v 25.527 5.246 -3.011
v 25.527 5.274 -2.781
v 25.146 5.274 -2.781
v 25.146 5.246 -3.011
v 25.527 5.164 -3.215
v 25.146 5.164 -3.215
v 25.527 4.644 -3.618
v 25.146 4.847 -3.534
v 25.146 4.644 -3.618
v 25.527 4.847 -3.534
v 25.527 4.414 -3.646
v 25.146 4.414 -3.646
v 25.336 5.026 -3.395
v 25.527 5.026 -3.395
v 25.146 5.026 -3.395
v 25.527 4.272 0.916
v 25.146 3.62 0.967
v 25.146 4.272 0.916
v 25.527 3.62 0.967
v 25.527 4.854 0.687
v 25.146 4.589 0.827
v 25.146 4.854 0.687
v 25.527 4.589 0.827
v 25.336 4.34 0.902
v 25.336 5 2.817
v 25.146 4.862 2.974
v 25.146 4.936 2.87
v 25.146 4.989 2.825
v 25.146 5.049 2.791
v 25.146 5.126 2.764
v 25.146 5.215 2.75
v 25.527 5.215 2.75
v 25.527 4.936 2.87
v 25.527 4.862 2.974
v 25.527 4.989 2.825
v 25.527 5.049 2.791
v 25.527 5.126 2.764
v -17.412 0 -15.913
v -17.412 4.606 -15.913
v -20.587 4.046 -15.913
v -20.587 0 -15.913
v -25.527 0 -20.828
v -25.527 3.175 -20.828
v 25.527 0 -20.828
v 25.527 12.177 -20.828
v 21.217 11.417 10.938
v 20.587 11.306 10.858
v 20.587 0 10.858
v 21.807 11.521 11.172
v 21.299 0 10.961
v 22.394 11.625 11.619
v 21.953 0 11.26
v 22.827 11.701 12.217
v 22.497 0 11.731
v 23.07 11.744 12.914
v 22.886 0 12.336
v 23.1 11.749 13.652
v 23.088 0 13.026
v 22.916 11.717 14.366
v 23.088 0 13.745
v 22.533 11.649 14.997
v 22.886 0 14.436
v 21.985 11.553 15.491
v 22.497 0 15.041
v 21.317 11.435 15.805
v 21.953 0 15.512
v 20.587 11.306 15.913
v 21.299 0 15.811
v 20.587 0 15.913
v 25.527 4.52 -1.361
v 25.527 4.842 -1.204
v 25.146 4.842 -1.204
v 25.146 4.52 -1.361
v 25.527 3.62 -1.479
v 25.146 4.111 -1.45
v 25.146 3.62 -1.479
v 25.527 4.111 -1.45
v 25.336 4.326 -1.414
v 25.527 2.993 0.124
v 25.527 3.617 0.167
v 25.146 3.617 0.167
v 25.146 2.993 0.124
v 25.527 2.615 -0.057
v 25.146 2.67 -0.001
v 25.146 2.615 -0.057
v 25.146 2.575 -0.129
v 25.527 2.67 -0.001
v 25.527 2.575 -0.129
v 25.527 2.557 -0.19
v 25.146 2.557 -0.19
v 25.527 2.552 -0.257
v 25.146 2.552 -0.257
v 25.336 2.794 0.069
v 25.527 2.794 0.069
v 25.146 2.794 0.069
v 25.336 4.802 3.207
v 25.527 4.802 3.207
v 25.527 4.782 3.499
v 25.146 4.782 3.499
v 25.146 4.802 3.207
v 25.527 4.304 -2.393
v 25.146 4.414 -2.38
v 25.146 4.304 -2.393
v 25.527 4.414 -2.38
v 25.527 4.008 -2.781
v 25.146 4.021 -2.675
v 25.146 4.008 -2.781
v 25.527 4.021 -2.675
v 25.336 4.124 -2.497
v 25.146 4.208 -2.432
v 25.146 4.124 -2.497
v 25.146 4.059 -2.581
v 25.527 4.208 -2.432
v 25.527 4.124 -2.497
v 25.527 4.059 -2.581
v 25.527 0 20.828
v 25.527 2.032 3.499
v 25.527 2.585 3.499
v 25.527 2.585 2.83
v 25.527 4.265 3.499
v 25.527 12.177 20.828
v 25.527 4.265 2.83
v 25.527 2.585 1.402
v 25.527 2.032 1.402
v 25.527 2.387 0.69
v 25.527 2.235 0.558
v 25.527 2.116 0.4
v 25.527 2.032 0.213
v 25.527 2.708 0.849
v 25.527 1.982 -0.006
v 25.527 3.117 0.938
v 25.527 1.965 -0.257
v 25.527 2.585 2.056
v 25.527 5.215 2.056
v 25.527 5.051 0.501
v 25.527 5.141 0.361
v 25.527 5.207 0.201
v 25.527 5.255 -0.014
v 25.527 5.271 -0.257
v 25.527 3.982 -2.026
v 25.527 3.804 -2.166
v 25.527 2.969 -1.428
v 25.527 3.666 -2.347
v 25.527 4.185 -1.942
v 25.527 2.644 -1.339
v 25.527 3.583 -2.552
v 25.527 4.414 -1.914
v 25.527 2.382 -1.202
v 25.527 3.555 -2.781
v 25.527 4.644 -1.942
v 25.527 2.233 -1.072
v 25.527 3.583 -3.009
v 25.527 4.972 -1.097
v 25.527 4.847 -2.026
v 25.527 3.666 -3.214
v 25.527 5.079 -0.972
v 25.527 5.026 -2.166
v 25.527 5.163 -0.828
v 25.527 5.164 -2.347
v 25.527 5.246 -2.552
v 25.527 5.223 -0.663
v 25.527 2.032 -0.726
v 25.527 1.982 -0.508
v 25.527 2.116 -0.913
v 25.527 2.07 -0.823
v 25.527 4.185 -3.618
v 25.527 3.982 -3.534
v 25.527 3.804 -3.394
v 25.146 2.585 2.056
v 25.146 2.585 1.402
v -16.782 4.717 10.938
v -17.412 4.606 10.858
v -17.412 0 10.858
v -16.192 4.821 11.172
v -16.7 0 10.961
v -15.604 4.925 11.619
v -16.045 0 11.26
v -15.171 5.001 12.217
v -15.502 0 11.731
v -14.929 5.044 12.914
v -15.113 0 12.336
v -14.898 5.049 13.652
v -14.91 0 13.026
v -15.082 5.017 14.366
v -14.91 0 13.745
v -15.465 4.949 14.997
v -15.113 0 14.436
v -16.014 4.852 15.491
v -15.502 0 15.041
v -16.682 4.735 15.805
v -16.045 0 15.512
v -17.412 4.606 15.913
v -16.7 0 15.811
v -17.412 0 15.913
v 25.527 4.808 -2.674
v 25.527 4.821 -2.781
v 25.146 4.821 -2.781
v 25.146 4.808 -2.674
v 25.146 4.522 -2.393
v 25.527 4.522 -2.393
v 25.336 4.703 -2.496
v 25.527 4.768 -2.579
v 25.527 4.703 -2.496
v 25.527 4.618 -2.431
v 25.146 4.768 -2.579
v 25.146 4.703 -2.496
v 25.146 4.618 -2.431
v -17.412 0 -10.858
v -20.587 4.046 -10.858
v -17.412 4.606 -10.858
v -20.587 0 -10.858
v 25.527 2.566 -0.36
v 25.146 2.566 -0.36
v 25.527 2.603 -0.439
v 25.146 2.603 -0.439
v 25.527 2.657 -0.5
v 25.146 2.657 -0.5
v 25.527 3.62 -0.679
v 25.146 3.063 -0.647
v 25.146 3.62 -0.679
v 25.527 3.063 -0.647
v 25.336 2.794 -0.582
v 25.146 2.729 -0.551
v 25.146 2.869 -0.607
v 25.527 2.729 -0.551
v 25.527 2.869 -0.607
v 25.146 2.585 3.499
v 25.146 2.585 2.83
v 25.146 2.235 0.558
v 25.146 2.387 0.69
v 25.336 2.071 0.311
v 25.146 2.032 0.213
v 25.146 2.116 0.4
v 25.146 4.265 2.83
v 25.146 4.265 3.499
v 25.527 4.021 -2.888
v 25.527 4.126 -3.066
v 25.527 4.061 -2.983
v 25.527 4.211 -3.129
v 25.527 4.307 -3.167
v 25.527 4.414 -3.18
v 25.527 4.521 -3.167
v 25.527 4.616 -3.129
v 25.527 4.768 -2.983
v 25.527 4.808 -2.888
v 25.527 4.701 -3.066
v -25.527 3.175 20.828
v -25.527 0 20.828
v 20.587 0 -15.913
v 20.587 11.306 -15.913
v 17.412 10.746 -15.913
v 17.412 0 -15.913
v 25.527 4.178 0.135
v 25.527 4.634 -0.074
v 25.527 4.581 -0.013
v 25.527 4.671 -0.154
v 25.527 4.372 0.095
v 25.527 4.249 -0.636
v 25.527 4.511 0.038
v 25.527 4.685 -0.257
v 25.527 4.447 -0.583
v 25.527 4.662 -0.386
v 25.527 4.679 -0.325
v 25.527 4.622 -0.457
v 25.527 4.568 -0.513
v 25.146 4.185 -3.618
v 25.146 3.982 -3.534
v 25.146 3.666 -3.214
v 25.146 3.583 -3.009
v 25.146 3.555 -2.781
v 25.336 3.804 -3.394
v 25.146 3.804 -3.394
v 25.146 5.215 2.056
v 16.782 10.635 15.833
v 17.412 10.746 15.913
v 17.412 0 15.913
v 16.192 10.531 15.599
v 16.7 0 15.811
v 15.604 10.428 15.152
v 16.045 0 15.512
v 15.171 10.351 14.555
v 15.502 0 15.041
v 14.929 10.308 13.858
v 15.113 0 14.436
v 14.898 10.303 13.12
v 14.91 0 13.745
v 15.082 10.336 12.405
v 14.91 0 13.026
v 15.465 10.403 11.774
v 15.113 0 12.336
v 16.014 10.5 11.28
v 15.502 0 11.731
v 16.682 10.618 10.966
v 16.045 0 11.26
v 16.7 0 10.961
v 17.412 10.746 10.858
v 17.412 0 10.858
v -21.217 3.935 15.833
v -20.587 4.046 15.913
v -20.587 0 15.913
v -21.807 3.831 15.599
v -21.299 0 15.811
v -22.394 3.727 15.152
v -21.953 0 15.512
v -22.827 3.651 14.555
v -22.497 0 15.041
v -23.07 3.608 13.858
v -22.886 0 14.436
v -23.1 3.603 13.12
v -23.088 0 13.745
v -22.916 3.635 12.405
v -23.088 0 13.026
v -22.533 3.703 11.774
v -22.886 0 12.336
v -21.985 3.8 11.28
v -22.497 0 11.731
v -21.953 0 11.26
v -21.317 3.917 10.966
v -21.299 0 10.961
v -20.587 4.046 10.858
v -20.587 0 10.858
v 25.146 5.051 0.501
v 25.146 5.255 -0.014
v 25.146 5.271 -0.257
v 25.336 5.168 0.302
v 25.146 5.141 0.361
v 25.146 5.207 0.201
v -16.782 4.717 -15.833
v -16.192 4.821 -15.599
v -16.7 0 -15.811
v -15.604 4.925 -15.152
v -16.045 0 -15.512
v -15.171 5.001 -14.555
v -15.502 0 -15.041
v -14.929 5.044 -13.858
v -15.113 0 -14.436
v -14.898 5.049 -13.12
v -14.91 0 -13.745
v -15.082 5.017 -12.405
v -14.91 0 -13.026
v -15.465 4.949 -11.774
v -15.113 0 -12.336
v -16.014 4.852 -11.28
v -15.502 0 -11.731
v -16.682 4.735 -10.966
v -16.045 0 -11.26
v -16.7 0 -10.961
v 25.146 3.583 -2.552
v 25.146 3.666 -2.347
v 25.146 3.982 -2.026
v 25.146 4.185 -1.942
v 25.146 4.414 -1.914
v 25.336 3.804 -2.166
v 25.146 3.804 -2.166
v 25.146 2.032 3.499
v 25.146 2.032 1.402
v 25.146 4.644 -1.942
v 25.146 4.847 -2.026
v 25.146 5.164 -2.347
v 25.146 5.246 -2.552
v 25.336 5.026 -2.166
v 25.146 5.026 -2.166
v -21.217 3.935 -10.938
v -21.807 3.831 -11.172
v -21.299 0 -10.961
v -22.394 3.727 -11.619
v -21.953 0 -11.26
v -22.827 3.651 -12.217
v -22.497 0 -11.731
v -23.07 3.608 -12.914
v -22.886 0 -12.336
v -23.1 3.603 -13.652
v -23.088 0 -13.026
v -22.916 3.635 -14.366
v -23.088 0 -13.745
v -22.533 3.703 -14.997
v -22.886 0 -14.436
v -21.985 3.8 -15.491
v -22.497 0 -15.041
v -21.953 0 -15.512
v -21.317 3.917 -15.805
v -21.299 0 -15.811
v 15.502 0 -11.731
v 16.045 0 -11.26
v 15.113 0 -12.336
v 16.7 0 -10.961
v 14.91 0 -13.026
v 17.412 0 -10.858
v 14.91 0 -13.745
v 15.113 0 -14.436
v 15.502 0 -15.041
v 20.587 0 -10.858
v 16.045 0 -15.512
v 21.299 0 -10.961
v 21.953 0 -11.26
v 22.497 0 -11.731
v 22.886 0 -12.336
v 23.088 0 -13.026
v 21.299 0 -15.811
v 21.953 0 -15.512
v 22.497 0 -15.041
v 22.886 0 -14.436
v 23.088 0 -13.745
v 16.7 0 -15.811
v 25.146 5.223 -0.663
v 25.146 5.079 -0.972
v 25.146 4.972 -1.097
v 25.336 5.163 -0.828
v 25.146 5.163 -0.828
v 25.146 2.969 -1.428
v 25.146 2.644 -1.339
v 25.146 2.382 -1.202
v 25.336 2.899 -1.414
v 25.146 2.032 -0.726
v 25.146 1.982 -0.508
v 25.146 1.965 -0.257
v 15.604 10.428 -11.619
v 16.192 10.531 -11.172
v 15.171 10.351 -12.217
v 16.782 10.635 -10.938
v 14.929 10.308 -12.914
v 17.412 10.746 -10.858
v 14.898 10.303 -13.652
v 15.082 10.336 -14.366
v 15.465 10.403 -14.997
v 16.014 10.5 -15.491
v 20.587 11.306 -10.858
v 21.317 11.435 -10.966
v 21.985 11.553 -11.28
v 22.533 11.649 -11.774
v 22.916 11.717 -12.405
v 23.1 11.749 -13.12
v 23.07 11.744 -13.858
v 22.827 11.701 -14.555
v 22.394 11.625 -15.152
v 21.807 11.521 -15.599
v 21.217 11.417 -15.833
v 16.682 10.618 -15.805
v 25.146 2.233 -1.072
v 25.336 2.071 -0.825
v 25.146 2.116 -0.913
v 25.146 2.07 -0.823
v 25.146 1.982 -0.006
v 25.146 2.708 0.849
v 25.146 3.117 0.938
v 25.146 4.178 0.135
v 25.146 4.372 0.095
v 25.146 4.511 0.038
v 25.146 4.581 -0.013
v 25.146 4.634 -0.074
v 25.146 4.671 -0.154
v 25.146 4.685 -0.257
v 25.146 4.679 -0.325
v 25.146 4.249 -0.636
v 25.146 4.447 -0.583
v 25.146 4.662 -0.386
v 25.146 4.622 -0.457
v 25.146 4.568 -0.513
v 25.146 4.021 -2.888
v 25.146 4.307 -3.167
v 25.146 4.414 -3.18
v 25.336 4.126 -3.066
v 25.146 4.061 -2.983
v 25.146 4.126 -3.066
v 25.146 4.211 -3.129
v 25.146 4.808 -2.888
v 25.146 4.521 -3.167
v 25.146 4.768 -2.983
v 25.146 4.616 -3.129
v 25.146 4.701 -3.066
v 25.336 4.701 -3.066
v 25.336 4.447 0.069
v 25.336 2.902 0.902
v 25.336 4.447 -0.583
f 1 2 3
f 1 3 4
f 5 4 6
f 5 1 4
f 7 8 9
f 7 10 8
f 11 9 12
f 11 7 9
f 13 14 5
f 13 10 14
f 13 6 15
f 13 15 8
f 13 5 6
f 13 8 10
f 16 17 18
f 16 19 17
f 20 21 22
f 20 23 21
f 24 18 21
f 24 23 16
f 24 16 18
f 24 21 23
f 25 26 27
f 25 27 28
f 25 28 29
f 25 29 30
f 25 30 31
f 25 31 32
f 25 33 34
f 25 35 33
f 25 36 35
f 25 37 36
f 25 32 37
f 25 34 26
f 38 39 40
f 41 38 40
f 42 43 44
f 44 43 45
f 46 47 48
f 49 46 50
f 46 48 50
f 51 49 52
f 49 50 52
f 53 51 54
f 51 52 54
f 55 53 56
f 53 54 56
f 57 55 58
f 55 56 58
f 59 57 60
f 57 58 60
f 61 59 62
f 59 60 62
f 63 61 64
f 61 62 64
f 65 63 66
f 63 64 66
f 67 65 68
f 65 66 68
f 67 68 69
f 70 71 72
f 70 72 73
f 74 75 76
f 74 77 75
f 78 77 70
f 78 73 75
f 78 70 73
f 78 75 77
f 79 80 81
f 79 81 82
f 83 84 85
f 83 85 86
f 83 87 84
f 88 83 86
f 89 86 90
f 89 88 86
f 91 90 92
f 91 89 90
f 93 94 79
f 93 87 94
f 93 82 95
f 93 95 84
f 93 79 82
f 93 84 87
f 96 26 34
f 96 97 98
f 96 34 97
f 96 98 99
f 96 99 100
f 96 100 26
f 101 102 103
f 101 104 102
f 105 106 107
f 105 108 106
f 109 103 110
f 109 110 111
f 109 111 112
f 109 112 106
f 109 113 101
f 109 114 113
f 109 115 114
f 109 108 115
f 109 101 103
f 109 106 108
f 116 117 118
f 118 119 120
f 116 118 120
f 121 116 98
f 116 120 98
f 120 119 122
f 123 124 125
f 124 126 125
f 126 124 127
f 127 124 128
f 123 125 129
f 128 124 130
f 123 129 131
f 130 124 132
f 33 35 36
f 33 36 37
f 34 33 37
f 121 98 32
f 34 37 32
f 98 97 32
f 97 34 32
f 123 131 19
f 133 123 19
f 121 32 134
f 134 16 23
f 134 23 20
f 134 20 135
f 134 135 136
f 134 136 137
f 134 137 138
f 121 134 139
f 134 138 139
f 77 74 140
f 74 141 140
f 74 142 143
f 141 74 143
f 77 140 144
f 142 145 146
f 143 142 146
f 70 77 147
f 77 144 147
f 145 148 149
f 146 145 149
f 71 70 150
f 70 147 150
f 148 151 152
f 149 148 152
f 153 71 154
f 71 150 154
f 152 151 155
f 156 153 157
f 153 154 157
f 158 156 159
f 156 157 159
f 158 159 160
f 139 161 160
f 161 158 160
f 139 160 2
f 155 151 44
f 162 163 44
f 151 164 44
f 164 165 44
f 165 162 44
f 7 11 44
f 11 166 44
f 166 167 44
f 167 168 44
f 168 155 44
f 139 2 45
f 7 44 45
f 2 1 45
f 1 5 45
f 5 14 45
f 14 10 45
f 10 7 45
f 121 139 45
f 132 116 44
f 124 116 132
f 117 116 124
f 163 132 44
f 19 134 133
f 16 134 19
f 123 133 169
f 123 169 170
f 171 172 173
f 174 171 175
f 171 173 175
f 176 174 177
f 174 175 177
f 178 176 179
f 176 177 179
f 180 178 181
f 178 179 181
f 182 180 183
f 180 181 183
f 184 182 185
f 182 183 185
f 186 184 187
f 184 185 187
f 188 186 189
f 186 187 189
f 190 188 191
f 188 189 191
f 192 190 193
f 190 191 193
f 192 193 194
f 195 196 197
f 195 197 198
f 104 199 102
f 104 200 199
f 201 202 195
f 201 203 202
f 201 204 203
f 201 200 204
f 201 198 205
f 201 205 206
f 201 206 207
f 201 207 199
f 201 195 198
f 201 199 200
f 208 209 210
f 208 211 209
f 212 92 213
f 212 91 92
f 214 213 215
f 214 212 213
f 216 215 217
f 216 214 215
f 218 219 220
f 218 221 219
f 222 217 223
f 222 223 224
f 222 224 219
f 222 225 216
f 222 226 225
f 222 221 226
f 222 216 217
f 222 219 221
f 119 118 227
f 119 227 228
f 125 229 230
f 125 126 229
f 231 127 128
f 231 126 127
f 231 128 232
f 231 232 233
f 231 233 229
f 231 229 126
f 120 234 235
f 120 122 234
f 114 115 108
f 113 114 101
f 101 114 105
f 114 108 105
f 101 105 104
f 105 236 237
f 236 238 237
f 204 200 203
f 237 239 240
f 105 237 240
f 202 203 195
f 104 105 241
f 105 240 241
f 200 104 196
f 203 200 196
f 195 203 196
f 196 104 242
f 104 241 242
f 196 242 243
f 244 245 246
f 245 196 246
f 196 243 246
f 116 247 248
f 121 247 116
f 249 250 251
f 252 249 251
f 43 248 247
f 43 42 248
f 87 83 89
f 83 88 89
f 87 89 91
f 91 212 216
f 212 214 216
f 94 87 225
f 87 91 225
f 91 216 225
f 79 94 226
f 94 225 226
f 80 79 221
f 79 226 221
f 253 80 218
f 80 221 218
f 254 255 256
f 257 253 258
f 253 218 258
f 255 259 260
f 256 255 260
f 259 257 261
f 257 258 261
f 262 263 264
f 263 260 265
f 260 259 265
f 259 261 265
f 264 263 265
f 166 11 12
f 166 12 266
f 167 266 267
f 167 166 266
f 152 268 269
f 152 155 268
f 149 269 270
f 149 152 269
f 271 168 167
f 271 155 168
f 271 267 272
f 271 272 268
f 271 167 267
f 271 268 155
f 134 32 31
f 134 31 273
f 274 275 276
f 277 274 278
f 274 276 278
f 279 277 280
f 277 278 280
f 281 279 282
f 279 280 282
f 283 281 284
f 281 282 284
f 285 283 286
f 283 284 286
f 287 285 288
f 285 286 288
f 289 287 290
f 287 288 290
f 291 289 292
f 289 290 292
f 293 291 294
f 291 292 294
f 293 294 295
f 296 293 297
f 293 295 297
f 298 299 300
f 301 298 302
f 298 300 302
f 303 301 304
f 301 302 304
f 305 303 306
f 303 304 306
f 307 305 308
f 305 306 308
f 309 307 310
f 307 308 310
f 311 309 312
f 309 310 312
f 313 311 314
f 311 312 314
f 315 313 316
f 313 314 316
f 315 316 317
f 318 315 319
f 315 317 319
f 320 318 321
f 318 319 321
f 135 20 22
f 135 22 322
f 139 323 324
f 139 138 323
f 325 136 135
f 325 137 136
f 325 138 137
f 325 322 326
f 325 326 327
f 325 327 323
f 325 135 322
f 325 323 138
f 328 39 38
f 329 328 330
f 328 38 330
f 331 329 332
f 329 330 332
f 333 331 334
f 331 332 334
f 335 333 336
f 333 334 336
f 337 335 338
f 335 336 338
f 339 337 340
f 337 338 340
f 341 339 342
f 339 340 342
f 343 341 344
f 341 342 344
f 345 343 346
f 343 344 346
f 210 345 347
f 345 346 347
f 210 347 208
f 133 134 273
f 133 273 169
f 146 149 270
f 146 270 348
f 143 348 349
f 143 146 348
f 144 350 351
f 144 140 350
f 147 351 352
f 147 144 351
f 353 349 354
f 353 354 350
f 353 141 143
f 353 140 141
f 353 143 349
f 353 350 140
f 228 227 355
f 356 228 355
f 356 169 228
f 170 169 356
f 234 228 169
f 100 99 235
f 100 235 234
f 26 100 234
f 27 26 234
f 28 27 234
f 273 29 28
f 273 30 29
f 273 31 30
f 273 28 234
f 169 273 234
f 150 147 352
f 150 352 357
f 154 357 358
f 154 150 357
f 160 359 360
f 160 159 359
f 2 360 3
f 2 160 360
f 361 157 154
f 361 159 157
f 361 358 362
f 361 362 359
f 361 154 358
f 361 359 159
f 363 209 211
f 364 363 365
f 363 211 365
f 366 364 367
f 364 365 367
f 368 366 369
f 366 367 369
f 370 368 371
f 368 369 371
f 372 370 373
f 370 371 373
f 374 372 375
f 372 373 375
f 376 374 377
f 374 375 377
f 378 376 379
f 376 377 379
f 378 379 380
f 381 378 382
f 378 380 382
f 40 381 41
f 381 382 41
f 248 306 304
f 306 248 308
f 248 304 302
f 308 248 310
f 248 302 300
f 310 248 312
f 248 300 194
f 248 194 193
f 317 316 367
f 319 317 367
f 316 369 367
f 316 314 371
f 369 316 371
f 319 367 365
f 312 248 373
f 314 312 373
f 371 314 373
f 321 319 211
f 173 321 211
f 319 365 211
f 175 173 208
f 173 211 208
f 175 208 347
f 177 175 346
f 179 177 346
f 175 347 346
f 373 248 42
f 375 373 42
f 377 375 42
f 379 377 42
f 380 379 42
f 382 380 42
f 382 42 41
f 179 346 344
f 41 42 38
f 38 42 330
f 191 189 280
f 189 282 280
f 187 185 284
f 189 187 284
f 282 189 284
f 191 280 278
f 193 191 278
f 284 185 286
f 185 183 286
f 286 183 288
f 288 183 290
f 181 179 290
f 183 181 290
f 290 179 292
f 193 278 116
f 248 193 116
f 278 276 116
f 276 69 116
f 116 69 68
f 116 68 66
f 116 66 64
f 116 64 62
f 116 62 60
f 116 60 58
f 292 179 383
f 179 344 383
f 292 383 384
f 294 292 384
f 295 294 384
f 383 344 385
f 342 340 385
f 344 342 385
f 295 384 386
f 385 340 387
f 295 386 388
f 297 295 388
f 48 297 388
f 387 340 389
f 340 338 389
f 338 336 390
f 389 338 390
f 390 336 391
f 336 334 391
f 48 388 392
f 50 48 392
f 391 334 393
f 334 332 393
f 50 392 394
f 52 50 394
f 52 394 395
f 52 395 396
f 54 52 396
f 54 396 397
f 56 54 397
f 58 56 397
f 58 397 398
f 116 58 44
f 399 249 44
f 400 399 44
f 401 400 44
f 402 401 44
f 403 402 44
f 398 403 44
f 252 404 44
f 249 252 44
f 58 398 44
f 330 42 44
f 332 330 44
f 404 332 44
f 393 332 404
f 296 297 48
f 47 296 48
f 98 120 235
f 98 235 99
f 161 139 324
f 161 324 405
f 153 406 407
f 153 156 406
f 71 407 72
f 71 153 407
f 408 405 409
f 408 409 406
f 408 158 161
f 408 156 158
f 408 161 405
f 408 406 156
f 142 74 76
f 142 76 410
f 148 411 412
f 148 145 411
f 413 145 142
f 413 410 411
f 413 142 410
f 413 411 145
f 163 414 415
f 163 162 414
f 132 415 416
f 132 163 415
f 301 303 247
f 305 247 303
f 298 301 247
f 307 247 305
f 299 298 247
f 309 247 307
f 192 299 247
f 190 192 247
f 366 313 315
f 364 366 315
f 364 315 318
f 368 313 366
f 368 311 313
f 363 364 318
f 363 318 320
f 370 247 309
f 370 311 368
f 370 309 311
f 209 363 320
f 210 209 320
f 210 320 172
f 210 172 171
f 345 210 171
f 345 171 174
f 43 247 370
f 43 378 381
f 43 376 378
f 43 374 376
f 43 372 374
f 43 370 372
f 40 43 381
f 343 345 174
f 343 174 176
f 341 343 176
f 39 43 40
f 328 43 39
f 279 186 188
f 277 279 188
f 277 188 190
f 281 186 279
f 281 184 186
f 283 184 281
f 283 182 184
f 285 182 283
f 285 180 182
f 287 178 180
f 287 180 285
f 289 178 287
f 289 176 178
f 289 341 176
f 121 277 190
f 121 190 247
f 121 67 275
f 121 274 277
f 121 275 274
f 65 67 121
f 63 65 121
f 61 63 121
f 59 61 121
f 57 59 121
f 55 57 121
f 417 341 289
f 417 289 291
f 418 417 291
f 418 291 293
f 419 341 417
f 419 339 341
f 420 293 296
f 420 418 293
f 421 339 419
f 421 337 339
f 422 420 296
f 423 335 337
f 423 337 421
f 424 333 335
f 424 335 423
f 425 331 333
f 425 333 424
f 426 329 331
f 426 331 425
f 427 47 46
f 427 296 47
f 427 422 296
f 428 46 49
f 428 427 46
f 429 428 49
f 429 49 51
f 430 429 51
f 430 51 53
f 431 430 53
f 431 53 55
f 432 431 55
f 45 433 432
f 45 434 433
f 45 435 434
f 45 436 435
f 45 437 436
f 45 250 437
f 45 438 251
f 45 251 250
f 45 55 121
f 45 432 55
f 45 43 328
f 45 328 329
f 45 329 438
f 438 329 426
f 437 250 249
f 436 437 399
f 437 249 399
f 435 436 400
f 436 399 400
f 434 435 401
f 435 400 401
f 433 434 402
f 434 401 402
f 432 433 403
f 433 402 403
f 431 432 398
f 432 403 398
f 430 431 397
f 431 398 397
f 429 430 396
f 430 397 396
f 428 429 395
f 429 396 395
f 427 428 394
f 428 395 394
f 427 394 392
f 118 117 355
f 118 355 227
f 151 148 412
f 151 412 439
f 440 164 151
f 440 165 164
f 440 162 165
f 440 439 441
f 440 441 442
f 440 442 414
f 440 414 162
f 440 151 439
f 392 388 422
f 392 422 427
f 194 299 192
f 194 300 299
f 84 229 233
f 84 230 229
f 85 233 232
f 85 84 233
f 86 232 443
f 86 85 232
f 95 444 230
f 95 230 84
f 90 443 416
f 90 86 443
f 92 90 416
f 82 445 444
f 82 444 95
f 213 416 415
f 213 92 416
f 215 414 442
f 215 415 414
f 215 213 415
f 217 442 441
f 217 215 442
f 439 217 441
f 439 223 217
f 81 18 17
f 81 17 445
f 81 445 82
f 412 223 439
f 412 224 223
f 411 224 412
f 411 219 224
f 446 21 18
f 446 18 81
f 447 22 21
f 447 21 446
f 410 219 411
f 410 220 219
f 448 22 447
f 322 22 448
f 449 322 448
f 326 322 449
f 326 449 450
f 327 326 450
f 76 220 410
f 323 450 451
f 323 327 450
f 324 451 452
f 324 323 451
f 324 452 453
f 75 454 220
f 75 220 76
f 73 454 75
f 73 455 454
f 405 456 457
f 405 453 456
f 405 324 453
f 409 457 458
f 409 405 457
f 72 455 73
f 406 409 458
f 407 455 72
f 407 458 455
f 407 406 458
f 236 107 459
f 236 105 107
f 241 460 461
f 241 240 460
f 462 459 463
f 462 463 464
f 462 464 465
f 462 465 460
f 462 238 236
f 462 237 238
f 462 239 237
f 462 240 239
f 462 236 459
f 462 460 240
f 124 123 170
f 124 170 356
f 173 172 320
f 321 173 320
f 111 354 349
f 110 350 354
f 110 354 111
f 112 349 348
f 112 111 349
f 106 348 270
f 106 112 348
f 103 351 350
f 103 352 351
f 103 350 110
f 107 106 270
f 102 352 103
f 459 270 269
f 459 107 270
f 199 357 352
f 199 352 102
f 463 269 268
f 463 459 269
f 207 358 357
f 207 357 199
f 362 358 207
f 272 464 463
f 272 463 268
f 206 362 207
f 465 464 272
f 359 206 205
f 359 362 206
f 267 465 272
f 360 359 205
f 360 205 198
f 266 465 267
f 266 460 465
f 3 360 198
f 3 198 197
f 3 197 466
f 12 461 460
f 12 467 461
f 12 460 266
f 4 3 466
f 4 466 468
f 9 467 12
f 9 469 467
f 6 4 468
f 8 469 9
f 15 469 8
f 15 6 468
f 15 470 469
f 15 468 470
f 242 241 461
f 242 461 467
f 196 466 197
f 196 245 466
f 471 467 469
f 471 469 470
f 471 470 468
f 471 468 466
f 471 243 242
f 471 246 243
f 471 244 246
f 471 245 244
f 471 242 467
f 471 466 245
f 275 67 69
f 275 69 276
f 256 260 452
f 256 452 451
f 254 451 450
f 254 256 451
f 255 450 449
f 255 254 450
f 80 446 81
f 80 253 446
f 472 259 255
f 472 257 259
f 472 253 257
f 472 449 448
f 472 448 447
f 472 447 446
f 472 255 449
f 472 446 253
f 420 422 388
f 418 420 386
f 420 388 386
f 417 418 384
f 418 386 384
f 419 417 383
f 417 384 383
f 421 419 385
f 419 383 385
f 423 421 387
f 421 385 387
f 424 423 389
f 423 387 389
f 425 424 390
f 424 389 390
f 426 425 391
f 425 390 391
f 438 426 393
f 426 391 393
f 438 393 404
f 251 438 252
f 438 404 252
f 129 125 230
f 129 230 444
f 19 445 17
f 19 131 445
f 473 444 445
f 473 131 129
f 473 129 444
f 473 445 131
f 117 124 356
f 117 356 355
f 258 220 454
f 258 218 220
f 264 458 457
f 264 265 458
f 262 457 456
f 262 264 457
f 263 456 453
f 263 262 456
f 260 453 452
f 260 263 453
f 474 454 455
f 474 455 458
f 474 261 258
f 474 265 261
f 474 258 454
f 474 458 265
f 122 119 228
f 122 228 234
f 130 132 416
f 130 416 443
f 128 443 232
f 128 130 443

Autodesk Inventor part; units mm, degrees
ref_plane "YZ Plane" through (0, 0, 0) normal (1, 0, 0) x (0, 1, 0)
ref_plane "XZ Plane" through (0, 0, 0) normal (0, 1, 0) x (-1, 0, 0)
ref_plane "XY Plane" through (0, 0, 0) normal (0, 0, 1) x (1, 0, 0)
sketch "Sketch1" plane through (0, 0, 0) normal (0, 1, 0) x (-1, 0, 0)
  line L0 (25.527, 20.828) -> (-25.527, 20.828)
  line L1 (-25.527, 20.828) -> (-25.527, -20.828)
  line L2 (-25.527, -20.828) -> (25.527, -20.828)
  line L3 (25.527, -20.828) -> (25.527, 20.828)
  circle A0 centre (18.9992, 13.3858) radius 1.9837
  circle A1 centre (18.9992, -13.3858) radius 1.9837
  circle A2 centre (-18.9992, -13.3858) radius 1.9837
  circle A3 centre (-18.9992, 13.3858) radius 1.9837
  circle A4 centre (18.9992, 13.3858) radius 3.048 construction
  point P0 (0, 0)
  point P1 (25.527, 0)
  point P2 (0, -20.828)
  dimension "d0" = 3.9675
  dimension "d1" = 41.656
  dimension "d2" = 51.054
  dimension "d3" = 6.096
  dimension "d4" = 7.4422
  dimension "d5" = 6.5278
  dimension "d6" = 7.4422
  dimension "d7" = 6.5278
sketch "Sketch10" plane through (0, 0, 0) normal (0, 0, 1) x (1, 0, 0)
  line L0 (-25.527, 0) -> (25.527, 0)
  line L1 (25.527, 0) -> (25.527, 12.1772)
  line L2 (-25.527, 0) -> (-25.527, 3.175)
  line L3 (-25.527, 3.175) -> (25.527, 12.1772)
  point P0 (0, 0)
  dimension "d61" = 10
  dimension "d62" = 3.175
extrude "Extrusion8" add sketch "Sketch10" along normal mid plane 41.656
sketch "Sketch11" plane through (-25.527, 0, 20.828) normal (0, -1, 0) x (1, 0, 0)
  line L0 (46.1137, -7.4422) -> (42.9387, -7.4422) construction
  line L1 (46.1137, -4.9149) -> (42.9387, -4.9149)
  line L2 (42.9387, -9.9695) -> (46.1137, -9.9695)
  arc A0 (46.1137, -9.9695) -> (46.1137, -4.9149) centre (46.1137, -7.4422) ccw
  arc A1 (42.9387, -4.9149) -> (42.9387, -9.9695) centre (42.9387, -7.4422) ccw
  line L3 (46.1137, -34.2138) -> (42.9387, -34.2138) construction
  line L4 (51.054, -41.656) -> (51.054, 0) projected
  line L5 (46.1137, -36.7411) -> (42.9387, -36.7411)
  line L6 (42.9387, -31.6865) -> (46.1137, -31.6865)
  arc A2 (46.1137, -36.7411) -> (46.1137, -31.6865) centre (46.1137, -34.2138) ccw
  arc A3 (42.9387, -31.6865) -> (42.9387, -36.7411) centre (42.9387, -34.2138) ccw
  line L7 (8.1153, -34.2138) -> (4.9403, -34.2138) construction
  line L8 (8.1153, -36.7411) -> (4.9403, -36.7411)
  line L9 (4.9403, -31.6865) -> (8.1153, -31.6865)
  arc A4 (8.1153, -36.7411) -> (8.1153, -31.6865) centre (8.1153, -34.2138) ccw
  arc A5 (4.9403, -31.6865) -> (4.9403, -36.7411) centre (4.9403, -34.2138) ccw
  line L10 (8.1153, -7.4422) -> (4.9403, -7.4422) construction
  line L11 (8.1153, -9.9695) -> (4.9403, -9.9695)
  line L12 (4.9403, -4.9149) -> (8.1153, -4.9149)
  arc A6 (8.1153, -9.9695) -> (8.1153, -4.9149) centre (8.1153, -7.4422) ccw
  arc A7 (4.9403, -4.9149) -> (4.9403, -9.9695) centre (4.9403, -7.4422) ccw
  point P0 (25.527, -20.828)
  point P1 (44.5262, -7.4422)
  point P2 (44.5262, -34.2138)
  point P3 (6.5278, -34.2138)
  point P4 (6.5278, -7.4422)
  point P5 (44.5262, -7.4422)
  point P6 (44.5262, -34.2138)
  point P7 (6.5278, -34.2138)
  point P8 (6.5278, -7.4422)
  point P9 (44.5262, -9.9695)
  point P10 (6.5278, -36.7411)
  dimension "d65" = 3.175
  dimension "d66" = 2.5273
extrude "Extrusion9" cut sketch "Sketch11" against normal blind 41.656
sketch "Sketch13" plane through (25.527, 0, 20.828) normal (1, 0, 0) x (0, 0, -1)
  line L0 (41.656, 12.1772) -> (0, 12.1772) projected
  line L1 (0, 0) -> (0, 12.1772) projected
  line L2 (41.656, 0) -> (0, 0) projected
  line L3 (41.656, 12.1772) -> (41.656, 0) projected
  line L4 (25.4999, 2.032) -> (16.1561, 2.032)
  line L5 (19.4258, 2.032) -> (17.3288, 2.032)
  line L6 (17.3288, 2.032) -> (17.3288, 2.5852)
  line L7 (17.3288, 2.5852) -> (17.9978, 2.5852)
  line L8 (17.9978, 2.5852) -> (17.9978, 4.2653)
  line L9 (17.9978, 4.2653) -> (17.3288, 4.2653)
  line L10 (17.3288, 4.2653) -> (17.3288, 4.7825)
  spline S0 degree 2 poles (17.3288, 4.7825) (17.4755, 4.7825) (17.7662, 4.8211) (17.8537, 4.8622) knots 0 0 0 1 2 2 2
  spline S1 degree 2 poles (17.8537, 4.8622) (17.954, 4.9137) (18.0672, 5.0861) (18.0775, 5.2147) knots 0 0 0 1 2 2 2
  line L11 (18.0775, 5.2147) -> (18.7722, 5.2147)
  line L12 (18.7722, 5.2147) -> (18.7722, 2.5852)
  line L13 (18.7722, 2.5852) -> (19.4258, 2.5852)
  line L14 (19.4258, 2.5852) -> (19.4258, 2.032)
  spline S2 degree 2 poles (22.3074, 3.6195) (22.3074, 3.2078) (22.1762, 2.5903) (22.0296, 2.3819) knots 0 0 0 1 2 2 2
  spline S3 degree 2 poles (22.0296, 2.3819) (21.8855, 2.1761) (21.4198, 1.9651) (21.0853, 1.9651) knots 0 0 0 1 2 2 2
  spline S4 degree 2 poles (21.0853, 1.9651) (20.7482, 1.9651) (20.2851, 2.1761) (20.1385, 2.3871) knots 0 0 0 1 2 2 2
  spline S5 degree 2 poles (20.1385, 2.3871) (19.9918, 2.5955) (19.8606, 3.2078) (19.8606, 3.6195) knots 0 0 0 1 2 2 2
  spline S6 degree 2 poles (19.8606, 3.6195) (19.8606, 4.0415) (19.9918, 4.6384) (20.141, 4.8545) knots 0 0 0 1 2 2 2
  spline S7 degree 2 poles (20.141, 4.8545) (20.2903, 5.0655) (20.7611, 5.2713) (21.0853, 5.2713) knots 0 0 0 1 2 2 2
  spline S8 degree 2 poles (21.0853, 5.2713) (21.4275, 5.2713) (21.8855, 5.0552) (22.0321, 4.8416) knots 0 0 0 1 2 2 2
  spline S9 degree 2 poles (22.0321, 4.8416) (22.1762, 4.6332) (22.3074, 4.0183) (22.3074, 3.6195) knots 0 0 0 1 2 2 2
  spline S10 degree 2 poles (21.5073, 3.6195) (21.5073, 4.2087) (21.3143, 4.6847) (21.0853, 4.6847) knots 0 0 0 1 2 2 2
  spline S11 degree 2 poles (21.0853, 4.6847) (20.8563, 4.6847) (20.6608, 4.2087) (20.6608, 3.6169) knots 0 0 0 1 2 2 2
  spline S12 degree 2 poles (20.6608, 3.6169) (20.6608, 3.0354) (20.8563, 2.5517) (21.0853, 2.5517) knots 0 0 0 1 2 2 2
  spline S13 degree 2 poles (21.0853, 2.5517) (21.3117, 2.5517) (21.5073, 3.0354) (21.5073, 3.6195) knots 0 0 0 1 2 2 2
  spline S14 degree 2 poles (24.4738, 4.4145) (24.4738, 4.0518) (23.9696, 3.5552) (23.6093, 3.5552) knots 0 0 0 1 2 2 2
  spline S15 degree 2 poles (23.6093, 3.5552) (23.2466, 3.5552) (22.7423, 4.0518) (22.7423, 4.4145) knots 0 0 0 1 2 2 2
  spline S16 degree 2 poles (22.7423, 4.4145) (22.7423, 4.7773) (23.2466, 5.2739) (23.6093, 5.2739) knots 0 0 0 1 2 2 2
  spline S17 degree 2 poles (23.6093, 5.2739) (23.9721, 5.2739) (24.4738, 4.7773) (24.4738, 4.4145) knots 0 0 0 1 2 2 2
  spline S18 degree 2 poles (24.0081, 4.4145) (24.0081, 4.5818) (23.7792, 4.8211) (23.6093, 4.8211) knots 0 0 0 1 2 2 2
  spline S19 degree 2 poles (23.6093, 4.8211) (23.4395, 4.8211) (23.208, 4.5844) (23.208, 4.4145) knots 0 0 0 1 2 2 2
  spline S20 degree 2 poles (23.208, 4.4145) (23.208, 4.2396) (23.4421, 4.008) (23.6093, 4.008) knots 0 0 0 1 2 2 2
  spline S21 degree 2 poles (23.6093, 4.008) (23.7792, 4.008) (24.0081, 4.2447) (24.0081, 4.4145) knots 0 0 0 1 2 2 2
  point P0 (20.828, 0)
  point P1 (20.828, 0)
  point P2 (20.828, 2.032)
  dimension "d69" = 2.032
extrude "Extrusion10" cut sketch "Sketch13" against normal blind 0.381 contours S4 S5 S6 S7 S8 S9 S2 S3 L4 | L4 S3 S4 | L4 L6 L7 L8 L9 L10 S0 S1 L11 L12 L13 L14 | S14 S15 S16 S17
equation "\"d6\" = d4"
equation "\"d7\" = d5"
equation "\"d23\" = d22"
equation "\"d25\" = 0.5 * d24"
equation "\"d22\" = 3.175"
equation "\"d24\" = 4.7625"
properties part number "shim 10 Deg"
